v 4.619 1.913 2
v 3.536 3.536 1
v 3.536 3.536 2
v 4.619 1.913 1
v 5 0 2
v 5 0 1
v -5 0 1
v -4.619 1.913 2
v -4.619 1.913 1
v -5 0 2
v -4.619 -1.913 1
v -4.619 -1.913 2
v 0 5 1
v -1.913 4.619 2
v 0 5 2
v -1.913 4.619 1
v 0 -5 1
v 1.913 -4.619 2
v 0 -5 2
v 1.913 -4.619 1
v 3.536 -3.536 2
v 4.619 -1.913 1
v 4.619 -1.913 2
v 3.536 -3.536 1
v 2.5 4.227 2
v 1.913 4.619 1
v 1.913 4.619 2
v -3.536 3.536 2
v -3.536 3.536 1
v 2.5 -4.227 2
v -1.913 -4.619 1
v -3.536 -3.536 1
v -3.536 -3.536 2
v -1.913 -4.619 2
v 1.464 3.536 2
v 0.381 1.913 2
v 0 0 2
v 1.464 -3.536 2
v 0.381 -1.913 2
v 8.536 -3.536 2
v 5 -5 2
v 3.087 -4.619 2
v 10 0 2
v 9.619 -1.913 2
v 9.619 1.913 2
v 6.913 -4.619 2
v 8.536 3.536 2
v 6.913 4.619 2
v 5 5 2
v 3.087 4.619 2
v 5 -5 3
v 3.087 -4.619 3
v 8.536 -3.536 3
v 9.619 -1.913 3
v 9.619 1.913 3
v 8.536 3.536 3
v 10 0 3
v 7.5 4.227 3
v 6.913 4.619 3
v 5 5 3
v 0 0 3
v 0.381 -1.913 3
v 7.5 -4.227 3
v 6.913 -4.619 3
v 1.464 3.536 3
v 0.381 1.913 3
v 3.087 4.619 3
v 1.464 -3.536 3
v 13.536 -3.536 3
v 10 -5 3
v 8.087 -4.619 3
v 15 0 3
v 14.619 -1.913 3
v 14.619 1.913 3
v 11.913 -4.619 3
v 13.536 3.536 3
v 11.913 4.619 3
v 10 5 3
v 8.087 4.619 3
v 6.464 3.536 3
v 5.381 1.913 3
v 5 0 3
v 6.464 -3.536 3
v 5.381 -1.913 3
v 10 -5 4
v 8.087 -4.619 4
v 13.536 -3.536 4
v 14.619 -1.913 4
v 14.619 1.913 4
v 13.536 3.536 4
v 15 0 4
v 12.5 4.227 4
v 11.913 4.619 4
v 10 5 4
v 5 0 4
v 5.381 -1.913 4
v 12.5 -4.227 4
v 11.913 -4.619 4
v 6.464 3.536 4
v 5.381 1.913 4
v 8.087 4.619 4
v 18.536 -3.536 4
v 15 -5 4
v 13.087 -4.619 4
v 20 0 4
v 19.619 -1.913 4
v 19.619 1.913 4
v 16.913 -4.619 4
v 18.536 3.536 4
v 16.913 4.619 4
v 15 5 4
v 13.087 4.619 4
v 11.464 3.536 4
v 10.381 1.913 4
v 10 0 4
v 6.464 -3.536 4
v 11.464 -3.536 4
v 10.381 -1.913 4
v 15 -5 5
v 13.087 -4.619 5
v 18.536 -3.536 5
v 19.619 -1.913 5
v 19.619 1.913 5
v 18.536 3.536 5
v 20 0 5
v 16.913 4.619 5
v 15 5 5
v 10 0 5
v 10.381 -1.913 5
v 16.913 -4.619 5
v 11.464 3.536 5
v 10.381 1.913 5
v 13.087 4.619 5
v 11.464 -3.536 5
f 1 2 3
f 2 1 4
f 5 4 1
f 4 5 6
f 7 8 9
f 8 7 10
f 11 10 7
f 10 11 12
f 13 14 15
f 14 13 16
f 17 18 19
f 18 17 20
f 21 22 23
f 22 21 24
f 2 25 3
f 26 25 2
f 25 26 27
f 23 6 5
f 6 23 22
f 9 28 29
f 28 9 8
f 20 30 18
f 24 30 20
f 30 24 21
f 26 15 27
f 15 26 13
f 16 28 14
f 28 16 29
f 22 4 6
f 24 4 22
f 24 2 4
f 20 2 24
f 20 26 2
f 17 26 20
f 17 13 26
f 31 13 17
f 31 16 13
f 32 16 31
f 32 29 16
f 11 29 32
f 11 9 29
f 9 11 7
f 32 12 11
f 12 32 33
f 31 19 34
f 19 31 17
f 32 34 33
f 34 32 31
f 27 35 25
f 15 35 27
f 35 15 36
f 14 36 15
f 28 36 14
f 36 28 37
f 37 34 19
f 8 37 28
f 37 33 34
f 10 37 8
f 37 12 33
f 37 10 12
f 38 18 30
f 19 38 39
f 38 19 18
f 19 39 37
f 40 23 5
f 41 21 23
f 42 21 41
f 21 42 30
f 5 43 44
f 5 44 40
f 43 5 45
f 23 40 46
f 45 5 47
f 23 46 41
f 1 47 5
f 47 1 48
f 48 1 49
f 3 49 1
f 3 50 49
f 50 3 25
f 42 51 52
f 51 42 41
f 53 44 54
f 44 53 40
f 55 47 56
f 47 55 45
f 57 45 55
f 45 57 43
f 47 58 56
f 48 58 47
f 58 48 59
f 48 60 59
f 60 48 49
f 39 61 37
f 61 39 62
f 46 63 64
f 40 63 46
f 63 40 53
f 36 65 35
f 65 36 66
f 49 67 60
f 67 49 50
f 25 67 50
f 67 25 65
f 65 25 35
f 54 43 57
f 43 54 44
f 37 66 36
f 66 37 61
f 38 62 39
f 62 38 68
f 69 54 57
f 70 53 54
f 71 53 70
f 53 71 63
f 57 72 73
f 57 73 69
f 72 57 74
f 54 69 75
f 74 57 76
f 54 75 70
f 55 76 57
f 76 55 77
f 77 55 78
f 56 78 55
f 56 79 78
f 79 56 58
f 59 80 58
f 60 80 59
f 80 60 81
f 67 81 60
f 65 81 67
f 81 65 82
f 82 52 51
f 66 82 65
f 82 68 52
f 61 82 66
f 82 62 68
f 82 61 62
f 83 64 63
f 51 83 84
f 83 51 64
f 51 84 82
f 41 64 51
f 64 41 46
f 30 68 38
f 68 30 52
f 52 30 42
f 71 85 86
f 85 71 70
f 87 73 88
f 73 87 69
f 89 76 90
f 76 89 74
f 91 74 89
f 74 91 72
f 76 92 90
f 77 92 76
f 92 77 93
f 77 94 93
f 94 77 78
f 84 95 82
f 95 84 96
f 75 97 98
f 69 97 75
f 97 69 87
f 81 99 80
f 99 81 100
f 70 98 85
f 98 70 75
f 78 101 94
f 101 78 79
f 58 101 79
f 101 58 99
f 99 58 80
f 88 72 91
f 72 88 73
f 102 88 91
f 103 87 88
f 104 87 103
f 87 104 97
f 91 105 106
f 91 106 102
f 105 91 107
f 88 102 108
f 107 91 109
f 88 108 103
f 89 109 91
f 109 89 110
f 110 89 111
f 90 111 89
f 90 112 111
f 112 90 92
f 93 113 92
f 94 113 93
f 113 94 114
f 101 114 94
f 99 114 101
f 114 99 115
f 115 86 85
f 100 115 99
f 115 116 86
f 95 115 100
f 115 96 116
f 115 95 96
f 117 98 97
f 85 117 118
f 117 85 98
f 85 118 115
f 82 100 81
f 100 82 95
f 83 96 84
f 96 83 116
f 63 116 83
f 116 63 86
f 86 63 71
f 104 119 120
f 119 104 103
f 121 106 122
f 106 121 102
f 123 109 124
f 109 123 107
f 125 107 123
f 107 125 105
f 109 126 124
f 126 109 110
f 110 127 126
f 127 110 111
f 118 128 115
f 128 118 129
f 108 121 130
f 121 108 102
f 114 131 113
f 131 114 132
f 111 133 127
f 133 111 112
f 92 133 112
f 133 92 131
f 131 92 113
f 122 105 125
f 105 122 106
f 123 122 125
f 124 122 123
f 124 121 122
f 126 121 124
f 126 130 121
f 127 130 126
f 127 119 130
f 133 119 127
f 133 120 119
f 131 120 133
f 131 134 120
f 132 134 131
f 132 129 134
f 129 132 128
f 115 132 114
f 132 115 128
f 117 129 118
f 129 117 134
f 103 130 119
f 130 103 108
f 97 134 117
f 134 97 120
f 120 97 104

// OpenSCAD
module up() {
  translate([0,0,1]) children(0);
}

module red() {
  color("Red") children(0);
}

up() cylinder(r=5);
translate([5,0,0]) up() up() cylinder(r=5);
translate([10,0,0]) up() up() up() red() cylinder(r=5);
translate([15,0,0]) red() up() up() up() up() cylinder(r=5);
